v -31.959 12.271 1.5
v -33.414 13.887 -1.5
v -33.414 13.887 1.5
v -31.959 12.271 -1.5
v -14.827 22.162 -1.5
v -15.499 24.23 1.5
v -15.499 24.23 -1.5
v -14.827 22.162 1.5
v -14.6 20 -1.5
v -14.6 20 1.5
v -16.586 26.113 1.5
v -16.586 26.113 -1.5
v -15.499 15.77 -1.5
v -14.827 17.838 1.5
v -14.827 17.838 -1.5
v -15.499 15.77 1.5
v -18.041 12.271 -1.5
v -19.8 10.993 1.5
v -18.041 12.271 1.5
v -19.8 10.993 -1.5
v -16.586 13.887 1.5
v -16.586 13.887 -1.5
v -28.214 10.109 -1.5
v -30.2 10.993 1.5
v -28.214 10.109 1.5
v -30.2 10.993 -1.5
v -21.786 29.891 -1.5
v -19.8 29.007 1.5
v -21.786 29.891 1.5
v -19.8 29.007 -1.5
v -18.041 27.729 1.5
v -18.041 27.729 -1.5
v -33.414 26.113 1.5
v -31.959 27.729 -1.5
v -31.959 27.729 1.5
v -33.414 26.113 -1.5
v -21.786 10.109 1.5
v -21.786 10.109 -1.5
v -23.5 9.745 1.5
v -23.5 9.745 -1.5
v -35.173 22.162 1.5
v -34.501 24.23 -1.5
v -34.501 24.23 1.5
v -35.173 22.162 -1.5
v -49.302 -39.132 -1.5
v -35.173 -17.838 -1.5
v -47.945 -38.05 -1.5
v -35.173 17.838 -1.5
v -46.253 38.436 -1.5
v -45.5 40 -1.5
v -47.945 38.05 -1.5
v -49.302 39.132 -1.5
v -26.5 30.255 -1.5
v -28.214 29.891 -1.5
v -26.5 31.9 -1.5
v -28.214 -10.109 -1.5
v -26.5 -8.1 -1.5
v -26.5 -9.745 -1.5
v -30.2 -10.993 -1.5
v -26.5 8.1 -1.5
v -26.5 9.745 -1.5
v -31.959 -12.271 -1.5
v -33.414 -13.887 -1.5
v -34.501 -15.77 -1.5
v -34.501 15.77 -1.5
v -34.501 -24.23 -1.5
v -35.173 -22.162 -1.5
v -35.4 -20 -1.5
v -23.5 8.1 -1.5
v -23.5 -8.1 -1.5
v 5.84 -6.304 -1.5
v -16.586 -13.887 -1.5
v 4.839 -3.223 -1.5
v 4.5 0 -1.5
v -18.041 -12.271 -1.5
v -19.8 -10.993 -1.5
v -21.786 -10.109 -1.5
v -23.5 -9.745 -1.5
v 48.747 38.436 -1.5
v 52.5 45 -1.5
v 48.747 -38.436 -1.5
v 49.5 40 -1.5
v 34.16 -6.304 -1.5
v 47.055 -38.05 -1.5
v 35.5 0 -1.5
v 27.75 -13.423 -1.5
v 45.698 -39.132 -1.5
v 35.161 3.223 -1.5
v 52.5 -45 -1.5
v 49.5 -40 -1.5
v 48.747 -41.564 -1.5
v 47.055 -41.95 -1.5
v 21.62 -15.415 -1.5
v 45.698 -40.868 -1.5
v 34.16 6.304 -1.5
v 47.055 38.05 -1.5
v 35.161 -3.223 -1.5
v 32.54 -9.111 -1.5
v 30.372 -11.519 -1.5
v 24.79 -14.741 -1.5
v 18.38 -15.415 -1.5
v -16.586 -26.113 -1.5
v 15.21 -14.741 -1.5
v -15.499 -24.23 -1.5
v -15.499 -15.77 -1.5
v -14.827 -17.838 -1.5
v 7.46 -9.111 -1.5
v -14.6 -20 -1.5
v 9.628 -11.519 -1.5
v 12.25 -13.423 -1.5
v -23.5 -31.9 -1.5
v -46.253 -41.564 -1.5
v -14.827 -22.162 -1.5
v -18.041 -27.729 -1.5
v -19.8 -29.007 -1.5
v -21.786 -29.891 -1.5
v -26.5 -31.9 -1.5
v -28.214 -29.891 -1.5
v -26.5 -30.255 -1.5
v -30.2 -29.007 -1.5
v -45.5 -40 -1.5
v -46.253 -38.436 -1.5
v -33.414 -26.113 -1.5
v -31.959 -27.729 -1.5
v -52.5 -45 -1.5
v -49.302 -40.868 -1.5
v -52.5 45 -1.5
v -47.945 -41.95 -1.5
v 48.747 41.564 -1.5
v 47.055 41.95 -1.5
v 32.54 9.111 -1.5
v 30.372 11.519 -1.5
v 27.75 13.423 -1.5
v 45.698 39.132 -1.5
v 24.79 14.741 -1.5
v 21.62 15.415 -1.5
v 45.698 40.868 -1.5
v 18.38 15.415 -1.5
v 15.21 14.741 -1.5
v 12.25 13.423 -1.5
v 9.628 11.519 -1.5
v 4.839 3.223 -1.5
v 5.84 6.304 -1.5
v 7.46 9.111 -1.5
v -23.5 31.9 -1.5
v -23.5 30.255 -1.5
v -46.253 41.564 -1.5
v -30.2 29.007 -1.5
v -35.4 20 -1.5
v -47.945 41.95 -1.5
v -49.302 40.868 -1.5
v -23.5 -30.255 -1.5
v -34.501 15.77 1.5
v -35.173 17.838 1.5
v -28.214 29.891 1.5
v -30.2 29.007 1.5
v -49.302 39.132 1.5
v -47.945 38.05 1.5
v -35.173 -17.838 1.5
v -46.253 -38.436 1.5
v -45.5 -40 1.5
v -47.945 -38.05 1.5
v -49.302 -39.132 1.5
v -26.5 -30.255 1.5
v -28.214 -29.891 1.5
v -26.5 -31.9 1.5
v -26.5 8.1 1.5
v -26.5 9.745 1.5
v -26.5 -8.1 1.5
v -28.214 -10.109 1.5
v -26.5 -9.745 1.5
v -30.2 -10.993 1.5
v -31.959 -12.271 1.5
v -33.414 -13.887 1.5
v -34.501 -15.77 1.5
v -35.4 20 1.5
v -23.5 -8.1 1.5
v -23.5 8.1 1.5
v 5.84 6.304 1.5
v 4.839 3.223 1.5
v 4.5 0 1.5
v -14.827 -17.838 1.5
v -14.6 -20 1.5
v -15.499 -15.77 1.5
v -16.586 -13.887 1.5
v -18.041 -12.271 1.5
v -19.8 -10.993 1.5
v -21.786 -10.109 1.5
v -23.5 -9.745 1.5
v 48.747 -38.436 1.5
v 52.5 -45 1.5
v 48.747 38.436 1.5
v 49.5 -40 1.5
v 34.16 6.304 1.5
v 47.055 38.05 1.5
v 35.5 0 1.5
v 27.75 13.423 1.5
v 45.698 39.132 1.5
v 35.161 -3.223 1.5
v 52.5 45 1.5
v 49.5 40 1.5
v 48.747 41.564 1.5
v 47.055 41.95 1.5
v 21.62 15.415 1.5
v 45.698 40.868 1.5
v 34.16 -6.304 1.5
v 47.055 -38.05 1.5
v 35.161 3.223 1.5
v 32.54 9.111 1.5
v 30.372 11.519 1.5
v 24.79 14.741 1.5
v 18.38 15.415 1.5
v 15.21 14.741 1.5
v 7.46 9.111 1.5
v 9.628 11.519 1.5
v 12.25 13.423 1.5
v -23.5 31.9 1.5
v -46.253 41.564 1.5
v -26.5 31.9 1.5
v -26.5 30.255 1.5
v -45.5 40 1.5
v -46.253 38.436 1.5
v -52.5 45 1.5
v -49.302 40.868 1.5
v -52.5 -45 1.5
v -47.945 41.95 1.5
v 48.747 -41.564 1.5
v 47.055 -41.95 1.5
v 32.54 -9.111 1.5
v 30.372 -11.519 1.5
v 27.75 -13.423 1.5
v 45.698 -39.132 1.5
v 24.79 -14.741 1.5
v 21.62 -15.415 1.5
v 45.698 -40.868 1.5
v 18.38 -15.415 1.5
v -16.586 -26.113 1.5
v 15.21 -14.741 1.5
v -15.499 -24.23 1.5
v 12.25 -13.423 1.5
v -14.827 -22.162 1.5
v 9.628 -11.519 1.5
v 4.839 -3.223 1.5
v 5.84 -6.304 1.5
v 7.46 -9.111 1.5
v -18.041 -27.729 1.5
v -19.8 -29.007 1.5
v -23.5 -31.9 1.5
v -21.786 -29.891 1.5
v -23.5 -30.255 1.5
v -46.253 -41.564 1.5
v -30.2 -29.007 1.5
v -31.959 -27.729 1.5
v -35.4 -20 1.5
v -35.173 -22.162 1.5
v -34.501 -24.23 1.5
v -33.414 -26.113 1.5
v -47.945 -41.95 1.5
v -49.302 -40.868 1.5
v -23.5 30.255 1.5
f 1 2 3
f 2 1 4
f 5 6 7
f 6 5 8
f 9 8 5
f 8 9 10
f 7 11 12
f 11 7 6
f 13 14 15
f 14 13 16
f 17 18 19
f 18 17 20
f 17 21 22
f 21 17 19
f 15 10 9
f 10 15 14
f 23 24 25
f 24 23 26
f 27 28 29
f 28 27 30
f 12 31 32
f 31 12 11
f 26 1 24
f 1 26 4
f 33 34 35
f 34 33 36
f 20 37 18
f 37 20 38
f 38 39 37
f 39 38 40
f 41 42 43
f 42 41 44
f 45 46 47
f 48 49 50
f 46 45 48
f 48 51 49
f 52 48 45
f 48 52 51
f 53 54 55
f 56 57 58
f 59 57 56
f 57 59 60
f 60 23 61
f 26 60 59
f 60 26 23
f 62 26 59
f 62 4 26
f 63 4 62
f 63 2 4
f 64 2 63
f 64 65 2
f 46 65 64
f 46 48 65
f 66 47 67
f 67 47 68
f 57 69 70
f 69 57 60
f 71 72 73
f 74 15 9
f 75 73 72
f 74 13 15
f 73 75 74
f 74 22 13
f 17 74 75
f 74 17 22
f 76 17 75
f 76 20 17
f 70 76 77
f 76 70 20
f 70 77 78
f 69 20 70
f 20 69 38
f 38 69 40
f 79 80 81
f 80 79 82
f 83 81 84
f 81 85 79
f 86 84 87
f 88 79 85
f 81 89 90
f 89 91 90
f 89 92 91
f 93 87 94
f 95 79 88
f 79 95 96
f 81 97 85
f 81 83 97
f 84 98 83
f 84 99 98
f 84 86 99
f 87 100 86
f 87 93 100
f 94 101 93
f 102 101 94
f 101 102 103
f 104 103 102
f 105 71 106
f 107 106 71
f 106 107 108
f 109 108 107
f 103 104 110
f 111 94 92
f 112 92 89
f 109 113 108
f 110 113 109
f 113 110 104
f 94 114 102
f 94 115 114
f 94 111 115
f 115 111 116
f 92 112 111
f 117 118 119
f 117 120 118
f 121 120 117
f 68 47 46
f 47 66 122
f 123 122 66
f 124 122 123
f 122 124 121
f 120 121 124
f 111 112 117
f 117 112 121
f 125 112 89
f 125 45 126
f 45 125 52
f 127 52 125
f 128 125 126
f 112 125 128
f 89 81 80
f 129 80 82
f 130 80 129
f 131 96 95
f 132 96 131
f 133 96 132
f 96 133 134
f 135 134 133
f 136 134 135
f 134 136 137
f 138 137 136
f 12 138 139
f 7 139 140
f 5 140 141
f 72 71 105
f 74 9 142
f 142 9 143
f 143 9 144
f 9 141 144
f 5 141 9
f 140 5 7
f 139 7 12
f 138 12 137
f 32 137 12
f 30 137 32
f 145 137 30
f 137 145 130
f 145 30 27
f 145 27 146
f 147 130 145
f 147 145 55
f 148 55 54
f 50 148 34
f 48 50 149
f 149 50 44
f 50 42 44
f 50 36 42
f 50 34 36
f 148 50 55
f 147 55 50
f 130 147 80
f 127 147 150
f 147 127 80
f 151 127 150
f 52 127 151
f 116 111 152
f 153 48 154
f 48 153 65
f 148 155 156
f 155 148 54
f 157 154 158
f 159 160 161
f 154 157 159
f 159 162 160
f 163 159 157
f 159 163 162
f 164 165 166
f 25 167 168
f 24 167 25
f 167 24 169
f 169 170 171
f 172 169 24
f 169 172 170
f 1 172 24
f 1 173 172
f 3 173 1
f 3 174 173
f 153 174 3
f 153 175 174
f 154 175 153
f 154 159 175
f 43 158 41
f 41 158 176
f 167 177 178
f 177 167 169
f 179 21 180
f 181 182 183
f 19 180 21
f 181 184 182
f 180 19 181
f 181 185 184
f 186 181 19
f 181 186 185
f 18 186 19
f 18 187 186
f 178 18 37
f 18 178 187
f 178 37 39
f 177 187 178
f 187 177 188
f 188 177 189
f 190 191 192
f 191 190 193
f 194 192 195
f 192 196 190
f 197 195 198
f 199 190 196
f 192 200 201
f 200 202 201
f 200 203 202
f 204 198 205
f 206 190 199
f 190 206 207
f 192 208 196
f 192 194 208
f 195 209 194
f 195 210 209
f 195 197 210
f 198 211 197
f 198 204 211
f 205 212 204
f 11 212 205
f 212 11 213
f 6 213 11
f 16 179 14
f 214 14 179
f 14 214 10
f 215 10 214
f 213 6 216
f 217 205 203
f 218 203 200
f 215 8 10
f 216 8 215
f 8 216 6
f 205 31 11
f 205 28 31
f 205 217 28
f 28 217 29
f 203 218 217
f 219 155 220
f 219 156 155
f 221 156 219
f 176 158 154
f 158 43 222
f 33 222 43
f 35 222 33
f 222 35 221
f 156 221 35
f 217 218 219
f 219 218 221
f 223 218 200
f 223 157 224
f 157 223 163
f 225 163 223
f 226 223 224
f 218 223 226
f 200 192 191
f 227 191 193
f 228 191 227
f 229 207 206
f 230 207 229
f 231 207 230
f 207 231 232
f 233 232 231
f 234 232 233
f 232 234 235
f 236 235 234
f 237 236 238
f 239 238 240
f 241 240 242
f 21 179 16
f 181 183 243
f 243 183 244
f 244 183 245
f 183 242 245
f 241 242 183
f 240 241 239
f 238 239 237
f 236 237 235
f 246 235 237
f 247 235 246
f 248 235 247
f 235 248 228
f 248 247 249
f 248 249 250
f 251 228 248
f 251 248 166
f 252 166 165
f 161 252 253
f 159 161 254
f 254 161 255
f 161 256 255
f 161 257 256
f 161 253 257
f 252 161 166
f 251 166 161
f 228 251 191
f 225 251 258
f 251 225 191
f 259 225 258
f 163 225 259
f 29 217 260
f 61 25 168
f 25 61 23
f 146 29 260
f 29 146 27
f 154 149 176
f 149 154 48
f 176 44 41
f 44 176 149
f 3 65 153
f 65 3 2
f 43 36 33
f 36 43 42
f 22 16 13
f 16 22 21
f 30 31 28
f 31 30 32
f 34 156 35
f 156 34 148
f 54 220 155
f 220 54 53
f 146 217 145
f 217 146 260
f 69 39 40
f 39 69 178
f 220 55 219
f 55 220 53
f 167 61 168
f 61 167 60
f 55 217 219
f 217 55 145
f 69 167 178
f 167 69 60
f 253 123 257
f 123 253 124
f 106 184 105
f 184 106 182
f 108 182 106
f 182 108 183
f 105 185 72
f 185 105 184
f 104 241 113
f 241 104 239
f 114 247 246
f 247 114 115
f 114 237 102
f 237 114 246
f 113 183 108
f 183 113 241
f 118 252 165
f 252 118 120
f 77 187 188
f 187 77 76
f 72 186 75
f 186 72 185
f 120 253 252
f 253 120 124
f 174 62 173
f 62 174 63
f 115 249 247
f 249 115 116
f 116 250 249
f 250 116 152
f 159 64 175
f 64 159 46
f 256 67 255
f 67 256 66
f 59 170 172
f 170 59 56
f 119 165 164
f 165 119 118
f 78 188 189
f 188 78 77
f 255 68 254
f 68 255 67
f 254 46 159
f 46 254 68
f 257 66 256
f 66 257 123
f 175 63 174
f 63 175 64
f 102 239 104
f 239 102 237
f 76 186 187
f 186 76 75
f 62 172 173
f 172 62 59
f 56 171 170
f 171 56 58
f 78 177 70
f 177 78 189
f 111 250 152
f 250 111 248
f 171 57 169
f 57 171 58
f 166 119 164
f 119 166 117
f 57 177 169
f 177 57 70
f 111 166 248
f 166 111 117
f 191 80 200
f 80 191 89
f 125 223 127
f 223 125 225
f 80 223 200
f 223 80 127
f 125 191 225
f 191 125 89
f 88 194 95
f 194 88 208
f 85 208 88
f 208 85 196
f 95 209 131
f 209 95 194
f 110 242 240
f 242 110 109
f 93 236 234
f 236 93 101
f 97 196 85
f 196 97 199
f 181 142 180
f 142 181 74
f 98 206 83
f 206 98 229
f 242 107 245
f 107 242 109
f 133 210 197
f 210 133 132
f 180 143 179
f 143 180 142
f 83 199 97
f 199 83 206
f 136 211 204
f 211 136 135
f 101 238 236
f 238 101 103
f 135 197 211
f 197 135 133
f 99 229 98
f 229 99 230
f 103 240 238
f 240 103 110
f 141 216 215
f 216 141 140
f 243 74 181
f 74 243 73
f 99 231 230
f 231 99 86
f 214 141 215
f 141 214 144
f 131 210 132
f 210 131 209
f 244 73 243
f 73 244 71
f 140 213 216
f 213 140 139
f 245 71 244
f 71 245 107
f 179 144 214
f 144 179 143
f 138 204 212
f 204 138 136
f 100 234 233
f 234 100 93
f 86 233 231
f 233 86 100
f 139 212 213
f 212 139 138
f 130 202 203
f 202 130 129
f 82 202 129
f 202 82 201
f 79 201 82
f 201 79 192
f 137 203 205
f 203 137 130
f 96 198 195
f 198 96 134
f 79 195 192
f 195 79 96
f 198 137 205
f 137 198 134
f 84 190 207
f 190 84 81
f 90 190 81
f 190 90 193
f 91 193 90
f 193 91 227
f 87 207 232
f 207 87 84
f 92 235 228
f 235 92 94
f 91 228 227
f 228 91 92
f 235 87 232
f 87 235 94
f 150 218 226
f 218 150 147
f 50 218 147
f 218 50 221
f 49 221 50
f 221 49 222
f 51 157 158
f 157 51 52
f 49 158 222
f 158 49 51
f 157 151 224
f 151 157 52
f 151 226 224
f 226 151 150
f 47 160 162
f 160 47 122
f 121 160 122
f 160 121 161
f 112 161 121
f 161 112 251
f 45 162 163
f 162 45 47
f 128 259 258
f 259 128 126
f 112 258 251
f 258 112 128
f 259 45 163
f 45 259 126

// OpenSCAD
thick = 3;
module panel() { 
  
cube(size=[105, 90, thick], center=true); 

}

module usbhole() {
    cylinder(h = thick, r1 = 15.5,  r2 = 15.5, center = true);
}

module switchhole() {
    radius=10.4;
    union() {
        cylinder(h = thick, r1 = radius,  r2 = radius, center = true);
        cube(size=[3, radius*2 + 3, thick], center=true);
     }
}

module screwhole() {
    cylinder(h = thick, r1 = 2,  r2 = 2, center = true);
}
    
difference() {
    screwholeinset = 5;
    panel();
    translate([20,0,0]) usbhole();
    translate([-25,20,0]) switchhole();
    translate([-25,-20,0]) switchhole();
    translate([(105/2) -screwholeinset ,(90 / 2) -screwholeinset,0]) screwhole();
    translate([(105/2) -screwholeinset , - (90 / 2) + screwholeinset,0]) screwhole();
    translate([ -(105/2) +screwholeinset ,(90 / 2) -screwholeinset,0]) screwhole();
    translate([ -(105/2) +screwholeinset ,- (90 / 2) + screwholeinset,0]) screwhole();
}
